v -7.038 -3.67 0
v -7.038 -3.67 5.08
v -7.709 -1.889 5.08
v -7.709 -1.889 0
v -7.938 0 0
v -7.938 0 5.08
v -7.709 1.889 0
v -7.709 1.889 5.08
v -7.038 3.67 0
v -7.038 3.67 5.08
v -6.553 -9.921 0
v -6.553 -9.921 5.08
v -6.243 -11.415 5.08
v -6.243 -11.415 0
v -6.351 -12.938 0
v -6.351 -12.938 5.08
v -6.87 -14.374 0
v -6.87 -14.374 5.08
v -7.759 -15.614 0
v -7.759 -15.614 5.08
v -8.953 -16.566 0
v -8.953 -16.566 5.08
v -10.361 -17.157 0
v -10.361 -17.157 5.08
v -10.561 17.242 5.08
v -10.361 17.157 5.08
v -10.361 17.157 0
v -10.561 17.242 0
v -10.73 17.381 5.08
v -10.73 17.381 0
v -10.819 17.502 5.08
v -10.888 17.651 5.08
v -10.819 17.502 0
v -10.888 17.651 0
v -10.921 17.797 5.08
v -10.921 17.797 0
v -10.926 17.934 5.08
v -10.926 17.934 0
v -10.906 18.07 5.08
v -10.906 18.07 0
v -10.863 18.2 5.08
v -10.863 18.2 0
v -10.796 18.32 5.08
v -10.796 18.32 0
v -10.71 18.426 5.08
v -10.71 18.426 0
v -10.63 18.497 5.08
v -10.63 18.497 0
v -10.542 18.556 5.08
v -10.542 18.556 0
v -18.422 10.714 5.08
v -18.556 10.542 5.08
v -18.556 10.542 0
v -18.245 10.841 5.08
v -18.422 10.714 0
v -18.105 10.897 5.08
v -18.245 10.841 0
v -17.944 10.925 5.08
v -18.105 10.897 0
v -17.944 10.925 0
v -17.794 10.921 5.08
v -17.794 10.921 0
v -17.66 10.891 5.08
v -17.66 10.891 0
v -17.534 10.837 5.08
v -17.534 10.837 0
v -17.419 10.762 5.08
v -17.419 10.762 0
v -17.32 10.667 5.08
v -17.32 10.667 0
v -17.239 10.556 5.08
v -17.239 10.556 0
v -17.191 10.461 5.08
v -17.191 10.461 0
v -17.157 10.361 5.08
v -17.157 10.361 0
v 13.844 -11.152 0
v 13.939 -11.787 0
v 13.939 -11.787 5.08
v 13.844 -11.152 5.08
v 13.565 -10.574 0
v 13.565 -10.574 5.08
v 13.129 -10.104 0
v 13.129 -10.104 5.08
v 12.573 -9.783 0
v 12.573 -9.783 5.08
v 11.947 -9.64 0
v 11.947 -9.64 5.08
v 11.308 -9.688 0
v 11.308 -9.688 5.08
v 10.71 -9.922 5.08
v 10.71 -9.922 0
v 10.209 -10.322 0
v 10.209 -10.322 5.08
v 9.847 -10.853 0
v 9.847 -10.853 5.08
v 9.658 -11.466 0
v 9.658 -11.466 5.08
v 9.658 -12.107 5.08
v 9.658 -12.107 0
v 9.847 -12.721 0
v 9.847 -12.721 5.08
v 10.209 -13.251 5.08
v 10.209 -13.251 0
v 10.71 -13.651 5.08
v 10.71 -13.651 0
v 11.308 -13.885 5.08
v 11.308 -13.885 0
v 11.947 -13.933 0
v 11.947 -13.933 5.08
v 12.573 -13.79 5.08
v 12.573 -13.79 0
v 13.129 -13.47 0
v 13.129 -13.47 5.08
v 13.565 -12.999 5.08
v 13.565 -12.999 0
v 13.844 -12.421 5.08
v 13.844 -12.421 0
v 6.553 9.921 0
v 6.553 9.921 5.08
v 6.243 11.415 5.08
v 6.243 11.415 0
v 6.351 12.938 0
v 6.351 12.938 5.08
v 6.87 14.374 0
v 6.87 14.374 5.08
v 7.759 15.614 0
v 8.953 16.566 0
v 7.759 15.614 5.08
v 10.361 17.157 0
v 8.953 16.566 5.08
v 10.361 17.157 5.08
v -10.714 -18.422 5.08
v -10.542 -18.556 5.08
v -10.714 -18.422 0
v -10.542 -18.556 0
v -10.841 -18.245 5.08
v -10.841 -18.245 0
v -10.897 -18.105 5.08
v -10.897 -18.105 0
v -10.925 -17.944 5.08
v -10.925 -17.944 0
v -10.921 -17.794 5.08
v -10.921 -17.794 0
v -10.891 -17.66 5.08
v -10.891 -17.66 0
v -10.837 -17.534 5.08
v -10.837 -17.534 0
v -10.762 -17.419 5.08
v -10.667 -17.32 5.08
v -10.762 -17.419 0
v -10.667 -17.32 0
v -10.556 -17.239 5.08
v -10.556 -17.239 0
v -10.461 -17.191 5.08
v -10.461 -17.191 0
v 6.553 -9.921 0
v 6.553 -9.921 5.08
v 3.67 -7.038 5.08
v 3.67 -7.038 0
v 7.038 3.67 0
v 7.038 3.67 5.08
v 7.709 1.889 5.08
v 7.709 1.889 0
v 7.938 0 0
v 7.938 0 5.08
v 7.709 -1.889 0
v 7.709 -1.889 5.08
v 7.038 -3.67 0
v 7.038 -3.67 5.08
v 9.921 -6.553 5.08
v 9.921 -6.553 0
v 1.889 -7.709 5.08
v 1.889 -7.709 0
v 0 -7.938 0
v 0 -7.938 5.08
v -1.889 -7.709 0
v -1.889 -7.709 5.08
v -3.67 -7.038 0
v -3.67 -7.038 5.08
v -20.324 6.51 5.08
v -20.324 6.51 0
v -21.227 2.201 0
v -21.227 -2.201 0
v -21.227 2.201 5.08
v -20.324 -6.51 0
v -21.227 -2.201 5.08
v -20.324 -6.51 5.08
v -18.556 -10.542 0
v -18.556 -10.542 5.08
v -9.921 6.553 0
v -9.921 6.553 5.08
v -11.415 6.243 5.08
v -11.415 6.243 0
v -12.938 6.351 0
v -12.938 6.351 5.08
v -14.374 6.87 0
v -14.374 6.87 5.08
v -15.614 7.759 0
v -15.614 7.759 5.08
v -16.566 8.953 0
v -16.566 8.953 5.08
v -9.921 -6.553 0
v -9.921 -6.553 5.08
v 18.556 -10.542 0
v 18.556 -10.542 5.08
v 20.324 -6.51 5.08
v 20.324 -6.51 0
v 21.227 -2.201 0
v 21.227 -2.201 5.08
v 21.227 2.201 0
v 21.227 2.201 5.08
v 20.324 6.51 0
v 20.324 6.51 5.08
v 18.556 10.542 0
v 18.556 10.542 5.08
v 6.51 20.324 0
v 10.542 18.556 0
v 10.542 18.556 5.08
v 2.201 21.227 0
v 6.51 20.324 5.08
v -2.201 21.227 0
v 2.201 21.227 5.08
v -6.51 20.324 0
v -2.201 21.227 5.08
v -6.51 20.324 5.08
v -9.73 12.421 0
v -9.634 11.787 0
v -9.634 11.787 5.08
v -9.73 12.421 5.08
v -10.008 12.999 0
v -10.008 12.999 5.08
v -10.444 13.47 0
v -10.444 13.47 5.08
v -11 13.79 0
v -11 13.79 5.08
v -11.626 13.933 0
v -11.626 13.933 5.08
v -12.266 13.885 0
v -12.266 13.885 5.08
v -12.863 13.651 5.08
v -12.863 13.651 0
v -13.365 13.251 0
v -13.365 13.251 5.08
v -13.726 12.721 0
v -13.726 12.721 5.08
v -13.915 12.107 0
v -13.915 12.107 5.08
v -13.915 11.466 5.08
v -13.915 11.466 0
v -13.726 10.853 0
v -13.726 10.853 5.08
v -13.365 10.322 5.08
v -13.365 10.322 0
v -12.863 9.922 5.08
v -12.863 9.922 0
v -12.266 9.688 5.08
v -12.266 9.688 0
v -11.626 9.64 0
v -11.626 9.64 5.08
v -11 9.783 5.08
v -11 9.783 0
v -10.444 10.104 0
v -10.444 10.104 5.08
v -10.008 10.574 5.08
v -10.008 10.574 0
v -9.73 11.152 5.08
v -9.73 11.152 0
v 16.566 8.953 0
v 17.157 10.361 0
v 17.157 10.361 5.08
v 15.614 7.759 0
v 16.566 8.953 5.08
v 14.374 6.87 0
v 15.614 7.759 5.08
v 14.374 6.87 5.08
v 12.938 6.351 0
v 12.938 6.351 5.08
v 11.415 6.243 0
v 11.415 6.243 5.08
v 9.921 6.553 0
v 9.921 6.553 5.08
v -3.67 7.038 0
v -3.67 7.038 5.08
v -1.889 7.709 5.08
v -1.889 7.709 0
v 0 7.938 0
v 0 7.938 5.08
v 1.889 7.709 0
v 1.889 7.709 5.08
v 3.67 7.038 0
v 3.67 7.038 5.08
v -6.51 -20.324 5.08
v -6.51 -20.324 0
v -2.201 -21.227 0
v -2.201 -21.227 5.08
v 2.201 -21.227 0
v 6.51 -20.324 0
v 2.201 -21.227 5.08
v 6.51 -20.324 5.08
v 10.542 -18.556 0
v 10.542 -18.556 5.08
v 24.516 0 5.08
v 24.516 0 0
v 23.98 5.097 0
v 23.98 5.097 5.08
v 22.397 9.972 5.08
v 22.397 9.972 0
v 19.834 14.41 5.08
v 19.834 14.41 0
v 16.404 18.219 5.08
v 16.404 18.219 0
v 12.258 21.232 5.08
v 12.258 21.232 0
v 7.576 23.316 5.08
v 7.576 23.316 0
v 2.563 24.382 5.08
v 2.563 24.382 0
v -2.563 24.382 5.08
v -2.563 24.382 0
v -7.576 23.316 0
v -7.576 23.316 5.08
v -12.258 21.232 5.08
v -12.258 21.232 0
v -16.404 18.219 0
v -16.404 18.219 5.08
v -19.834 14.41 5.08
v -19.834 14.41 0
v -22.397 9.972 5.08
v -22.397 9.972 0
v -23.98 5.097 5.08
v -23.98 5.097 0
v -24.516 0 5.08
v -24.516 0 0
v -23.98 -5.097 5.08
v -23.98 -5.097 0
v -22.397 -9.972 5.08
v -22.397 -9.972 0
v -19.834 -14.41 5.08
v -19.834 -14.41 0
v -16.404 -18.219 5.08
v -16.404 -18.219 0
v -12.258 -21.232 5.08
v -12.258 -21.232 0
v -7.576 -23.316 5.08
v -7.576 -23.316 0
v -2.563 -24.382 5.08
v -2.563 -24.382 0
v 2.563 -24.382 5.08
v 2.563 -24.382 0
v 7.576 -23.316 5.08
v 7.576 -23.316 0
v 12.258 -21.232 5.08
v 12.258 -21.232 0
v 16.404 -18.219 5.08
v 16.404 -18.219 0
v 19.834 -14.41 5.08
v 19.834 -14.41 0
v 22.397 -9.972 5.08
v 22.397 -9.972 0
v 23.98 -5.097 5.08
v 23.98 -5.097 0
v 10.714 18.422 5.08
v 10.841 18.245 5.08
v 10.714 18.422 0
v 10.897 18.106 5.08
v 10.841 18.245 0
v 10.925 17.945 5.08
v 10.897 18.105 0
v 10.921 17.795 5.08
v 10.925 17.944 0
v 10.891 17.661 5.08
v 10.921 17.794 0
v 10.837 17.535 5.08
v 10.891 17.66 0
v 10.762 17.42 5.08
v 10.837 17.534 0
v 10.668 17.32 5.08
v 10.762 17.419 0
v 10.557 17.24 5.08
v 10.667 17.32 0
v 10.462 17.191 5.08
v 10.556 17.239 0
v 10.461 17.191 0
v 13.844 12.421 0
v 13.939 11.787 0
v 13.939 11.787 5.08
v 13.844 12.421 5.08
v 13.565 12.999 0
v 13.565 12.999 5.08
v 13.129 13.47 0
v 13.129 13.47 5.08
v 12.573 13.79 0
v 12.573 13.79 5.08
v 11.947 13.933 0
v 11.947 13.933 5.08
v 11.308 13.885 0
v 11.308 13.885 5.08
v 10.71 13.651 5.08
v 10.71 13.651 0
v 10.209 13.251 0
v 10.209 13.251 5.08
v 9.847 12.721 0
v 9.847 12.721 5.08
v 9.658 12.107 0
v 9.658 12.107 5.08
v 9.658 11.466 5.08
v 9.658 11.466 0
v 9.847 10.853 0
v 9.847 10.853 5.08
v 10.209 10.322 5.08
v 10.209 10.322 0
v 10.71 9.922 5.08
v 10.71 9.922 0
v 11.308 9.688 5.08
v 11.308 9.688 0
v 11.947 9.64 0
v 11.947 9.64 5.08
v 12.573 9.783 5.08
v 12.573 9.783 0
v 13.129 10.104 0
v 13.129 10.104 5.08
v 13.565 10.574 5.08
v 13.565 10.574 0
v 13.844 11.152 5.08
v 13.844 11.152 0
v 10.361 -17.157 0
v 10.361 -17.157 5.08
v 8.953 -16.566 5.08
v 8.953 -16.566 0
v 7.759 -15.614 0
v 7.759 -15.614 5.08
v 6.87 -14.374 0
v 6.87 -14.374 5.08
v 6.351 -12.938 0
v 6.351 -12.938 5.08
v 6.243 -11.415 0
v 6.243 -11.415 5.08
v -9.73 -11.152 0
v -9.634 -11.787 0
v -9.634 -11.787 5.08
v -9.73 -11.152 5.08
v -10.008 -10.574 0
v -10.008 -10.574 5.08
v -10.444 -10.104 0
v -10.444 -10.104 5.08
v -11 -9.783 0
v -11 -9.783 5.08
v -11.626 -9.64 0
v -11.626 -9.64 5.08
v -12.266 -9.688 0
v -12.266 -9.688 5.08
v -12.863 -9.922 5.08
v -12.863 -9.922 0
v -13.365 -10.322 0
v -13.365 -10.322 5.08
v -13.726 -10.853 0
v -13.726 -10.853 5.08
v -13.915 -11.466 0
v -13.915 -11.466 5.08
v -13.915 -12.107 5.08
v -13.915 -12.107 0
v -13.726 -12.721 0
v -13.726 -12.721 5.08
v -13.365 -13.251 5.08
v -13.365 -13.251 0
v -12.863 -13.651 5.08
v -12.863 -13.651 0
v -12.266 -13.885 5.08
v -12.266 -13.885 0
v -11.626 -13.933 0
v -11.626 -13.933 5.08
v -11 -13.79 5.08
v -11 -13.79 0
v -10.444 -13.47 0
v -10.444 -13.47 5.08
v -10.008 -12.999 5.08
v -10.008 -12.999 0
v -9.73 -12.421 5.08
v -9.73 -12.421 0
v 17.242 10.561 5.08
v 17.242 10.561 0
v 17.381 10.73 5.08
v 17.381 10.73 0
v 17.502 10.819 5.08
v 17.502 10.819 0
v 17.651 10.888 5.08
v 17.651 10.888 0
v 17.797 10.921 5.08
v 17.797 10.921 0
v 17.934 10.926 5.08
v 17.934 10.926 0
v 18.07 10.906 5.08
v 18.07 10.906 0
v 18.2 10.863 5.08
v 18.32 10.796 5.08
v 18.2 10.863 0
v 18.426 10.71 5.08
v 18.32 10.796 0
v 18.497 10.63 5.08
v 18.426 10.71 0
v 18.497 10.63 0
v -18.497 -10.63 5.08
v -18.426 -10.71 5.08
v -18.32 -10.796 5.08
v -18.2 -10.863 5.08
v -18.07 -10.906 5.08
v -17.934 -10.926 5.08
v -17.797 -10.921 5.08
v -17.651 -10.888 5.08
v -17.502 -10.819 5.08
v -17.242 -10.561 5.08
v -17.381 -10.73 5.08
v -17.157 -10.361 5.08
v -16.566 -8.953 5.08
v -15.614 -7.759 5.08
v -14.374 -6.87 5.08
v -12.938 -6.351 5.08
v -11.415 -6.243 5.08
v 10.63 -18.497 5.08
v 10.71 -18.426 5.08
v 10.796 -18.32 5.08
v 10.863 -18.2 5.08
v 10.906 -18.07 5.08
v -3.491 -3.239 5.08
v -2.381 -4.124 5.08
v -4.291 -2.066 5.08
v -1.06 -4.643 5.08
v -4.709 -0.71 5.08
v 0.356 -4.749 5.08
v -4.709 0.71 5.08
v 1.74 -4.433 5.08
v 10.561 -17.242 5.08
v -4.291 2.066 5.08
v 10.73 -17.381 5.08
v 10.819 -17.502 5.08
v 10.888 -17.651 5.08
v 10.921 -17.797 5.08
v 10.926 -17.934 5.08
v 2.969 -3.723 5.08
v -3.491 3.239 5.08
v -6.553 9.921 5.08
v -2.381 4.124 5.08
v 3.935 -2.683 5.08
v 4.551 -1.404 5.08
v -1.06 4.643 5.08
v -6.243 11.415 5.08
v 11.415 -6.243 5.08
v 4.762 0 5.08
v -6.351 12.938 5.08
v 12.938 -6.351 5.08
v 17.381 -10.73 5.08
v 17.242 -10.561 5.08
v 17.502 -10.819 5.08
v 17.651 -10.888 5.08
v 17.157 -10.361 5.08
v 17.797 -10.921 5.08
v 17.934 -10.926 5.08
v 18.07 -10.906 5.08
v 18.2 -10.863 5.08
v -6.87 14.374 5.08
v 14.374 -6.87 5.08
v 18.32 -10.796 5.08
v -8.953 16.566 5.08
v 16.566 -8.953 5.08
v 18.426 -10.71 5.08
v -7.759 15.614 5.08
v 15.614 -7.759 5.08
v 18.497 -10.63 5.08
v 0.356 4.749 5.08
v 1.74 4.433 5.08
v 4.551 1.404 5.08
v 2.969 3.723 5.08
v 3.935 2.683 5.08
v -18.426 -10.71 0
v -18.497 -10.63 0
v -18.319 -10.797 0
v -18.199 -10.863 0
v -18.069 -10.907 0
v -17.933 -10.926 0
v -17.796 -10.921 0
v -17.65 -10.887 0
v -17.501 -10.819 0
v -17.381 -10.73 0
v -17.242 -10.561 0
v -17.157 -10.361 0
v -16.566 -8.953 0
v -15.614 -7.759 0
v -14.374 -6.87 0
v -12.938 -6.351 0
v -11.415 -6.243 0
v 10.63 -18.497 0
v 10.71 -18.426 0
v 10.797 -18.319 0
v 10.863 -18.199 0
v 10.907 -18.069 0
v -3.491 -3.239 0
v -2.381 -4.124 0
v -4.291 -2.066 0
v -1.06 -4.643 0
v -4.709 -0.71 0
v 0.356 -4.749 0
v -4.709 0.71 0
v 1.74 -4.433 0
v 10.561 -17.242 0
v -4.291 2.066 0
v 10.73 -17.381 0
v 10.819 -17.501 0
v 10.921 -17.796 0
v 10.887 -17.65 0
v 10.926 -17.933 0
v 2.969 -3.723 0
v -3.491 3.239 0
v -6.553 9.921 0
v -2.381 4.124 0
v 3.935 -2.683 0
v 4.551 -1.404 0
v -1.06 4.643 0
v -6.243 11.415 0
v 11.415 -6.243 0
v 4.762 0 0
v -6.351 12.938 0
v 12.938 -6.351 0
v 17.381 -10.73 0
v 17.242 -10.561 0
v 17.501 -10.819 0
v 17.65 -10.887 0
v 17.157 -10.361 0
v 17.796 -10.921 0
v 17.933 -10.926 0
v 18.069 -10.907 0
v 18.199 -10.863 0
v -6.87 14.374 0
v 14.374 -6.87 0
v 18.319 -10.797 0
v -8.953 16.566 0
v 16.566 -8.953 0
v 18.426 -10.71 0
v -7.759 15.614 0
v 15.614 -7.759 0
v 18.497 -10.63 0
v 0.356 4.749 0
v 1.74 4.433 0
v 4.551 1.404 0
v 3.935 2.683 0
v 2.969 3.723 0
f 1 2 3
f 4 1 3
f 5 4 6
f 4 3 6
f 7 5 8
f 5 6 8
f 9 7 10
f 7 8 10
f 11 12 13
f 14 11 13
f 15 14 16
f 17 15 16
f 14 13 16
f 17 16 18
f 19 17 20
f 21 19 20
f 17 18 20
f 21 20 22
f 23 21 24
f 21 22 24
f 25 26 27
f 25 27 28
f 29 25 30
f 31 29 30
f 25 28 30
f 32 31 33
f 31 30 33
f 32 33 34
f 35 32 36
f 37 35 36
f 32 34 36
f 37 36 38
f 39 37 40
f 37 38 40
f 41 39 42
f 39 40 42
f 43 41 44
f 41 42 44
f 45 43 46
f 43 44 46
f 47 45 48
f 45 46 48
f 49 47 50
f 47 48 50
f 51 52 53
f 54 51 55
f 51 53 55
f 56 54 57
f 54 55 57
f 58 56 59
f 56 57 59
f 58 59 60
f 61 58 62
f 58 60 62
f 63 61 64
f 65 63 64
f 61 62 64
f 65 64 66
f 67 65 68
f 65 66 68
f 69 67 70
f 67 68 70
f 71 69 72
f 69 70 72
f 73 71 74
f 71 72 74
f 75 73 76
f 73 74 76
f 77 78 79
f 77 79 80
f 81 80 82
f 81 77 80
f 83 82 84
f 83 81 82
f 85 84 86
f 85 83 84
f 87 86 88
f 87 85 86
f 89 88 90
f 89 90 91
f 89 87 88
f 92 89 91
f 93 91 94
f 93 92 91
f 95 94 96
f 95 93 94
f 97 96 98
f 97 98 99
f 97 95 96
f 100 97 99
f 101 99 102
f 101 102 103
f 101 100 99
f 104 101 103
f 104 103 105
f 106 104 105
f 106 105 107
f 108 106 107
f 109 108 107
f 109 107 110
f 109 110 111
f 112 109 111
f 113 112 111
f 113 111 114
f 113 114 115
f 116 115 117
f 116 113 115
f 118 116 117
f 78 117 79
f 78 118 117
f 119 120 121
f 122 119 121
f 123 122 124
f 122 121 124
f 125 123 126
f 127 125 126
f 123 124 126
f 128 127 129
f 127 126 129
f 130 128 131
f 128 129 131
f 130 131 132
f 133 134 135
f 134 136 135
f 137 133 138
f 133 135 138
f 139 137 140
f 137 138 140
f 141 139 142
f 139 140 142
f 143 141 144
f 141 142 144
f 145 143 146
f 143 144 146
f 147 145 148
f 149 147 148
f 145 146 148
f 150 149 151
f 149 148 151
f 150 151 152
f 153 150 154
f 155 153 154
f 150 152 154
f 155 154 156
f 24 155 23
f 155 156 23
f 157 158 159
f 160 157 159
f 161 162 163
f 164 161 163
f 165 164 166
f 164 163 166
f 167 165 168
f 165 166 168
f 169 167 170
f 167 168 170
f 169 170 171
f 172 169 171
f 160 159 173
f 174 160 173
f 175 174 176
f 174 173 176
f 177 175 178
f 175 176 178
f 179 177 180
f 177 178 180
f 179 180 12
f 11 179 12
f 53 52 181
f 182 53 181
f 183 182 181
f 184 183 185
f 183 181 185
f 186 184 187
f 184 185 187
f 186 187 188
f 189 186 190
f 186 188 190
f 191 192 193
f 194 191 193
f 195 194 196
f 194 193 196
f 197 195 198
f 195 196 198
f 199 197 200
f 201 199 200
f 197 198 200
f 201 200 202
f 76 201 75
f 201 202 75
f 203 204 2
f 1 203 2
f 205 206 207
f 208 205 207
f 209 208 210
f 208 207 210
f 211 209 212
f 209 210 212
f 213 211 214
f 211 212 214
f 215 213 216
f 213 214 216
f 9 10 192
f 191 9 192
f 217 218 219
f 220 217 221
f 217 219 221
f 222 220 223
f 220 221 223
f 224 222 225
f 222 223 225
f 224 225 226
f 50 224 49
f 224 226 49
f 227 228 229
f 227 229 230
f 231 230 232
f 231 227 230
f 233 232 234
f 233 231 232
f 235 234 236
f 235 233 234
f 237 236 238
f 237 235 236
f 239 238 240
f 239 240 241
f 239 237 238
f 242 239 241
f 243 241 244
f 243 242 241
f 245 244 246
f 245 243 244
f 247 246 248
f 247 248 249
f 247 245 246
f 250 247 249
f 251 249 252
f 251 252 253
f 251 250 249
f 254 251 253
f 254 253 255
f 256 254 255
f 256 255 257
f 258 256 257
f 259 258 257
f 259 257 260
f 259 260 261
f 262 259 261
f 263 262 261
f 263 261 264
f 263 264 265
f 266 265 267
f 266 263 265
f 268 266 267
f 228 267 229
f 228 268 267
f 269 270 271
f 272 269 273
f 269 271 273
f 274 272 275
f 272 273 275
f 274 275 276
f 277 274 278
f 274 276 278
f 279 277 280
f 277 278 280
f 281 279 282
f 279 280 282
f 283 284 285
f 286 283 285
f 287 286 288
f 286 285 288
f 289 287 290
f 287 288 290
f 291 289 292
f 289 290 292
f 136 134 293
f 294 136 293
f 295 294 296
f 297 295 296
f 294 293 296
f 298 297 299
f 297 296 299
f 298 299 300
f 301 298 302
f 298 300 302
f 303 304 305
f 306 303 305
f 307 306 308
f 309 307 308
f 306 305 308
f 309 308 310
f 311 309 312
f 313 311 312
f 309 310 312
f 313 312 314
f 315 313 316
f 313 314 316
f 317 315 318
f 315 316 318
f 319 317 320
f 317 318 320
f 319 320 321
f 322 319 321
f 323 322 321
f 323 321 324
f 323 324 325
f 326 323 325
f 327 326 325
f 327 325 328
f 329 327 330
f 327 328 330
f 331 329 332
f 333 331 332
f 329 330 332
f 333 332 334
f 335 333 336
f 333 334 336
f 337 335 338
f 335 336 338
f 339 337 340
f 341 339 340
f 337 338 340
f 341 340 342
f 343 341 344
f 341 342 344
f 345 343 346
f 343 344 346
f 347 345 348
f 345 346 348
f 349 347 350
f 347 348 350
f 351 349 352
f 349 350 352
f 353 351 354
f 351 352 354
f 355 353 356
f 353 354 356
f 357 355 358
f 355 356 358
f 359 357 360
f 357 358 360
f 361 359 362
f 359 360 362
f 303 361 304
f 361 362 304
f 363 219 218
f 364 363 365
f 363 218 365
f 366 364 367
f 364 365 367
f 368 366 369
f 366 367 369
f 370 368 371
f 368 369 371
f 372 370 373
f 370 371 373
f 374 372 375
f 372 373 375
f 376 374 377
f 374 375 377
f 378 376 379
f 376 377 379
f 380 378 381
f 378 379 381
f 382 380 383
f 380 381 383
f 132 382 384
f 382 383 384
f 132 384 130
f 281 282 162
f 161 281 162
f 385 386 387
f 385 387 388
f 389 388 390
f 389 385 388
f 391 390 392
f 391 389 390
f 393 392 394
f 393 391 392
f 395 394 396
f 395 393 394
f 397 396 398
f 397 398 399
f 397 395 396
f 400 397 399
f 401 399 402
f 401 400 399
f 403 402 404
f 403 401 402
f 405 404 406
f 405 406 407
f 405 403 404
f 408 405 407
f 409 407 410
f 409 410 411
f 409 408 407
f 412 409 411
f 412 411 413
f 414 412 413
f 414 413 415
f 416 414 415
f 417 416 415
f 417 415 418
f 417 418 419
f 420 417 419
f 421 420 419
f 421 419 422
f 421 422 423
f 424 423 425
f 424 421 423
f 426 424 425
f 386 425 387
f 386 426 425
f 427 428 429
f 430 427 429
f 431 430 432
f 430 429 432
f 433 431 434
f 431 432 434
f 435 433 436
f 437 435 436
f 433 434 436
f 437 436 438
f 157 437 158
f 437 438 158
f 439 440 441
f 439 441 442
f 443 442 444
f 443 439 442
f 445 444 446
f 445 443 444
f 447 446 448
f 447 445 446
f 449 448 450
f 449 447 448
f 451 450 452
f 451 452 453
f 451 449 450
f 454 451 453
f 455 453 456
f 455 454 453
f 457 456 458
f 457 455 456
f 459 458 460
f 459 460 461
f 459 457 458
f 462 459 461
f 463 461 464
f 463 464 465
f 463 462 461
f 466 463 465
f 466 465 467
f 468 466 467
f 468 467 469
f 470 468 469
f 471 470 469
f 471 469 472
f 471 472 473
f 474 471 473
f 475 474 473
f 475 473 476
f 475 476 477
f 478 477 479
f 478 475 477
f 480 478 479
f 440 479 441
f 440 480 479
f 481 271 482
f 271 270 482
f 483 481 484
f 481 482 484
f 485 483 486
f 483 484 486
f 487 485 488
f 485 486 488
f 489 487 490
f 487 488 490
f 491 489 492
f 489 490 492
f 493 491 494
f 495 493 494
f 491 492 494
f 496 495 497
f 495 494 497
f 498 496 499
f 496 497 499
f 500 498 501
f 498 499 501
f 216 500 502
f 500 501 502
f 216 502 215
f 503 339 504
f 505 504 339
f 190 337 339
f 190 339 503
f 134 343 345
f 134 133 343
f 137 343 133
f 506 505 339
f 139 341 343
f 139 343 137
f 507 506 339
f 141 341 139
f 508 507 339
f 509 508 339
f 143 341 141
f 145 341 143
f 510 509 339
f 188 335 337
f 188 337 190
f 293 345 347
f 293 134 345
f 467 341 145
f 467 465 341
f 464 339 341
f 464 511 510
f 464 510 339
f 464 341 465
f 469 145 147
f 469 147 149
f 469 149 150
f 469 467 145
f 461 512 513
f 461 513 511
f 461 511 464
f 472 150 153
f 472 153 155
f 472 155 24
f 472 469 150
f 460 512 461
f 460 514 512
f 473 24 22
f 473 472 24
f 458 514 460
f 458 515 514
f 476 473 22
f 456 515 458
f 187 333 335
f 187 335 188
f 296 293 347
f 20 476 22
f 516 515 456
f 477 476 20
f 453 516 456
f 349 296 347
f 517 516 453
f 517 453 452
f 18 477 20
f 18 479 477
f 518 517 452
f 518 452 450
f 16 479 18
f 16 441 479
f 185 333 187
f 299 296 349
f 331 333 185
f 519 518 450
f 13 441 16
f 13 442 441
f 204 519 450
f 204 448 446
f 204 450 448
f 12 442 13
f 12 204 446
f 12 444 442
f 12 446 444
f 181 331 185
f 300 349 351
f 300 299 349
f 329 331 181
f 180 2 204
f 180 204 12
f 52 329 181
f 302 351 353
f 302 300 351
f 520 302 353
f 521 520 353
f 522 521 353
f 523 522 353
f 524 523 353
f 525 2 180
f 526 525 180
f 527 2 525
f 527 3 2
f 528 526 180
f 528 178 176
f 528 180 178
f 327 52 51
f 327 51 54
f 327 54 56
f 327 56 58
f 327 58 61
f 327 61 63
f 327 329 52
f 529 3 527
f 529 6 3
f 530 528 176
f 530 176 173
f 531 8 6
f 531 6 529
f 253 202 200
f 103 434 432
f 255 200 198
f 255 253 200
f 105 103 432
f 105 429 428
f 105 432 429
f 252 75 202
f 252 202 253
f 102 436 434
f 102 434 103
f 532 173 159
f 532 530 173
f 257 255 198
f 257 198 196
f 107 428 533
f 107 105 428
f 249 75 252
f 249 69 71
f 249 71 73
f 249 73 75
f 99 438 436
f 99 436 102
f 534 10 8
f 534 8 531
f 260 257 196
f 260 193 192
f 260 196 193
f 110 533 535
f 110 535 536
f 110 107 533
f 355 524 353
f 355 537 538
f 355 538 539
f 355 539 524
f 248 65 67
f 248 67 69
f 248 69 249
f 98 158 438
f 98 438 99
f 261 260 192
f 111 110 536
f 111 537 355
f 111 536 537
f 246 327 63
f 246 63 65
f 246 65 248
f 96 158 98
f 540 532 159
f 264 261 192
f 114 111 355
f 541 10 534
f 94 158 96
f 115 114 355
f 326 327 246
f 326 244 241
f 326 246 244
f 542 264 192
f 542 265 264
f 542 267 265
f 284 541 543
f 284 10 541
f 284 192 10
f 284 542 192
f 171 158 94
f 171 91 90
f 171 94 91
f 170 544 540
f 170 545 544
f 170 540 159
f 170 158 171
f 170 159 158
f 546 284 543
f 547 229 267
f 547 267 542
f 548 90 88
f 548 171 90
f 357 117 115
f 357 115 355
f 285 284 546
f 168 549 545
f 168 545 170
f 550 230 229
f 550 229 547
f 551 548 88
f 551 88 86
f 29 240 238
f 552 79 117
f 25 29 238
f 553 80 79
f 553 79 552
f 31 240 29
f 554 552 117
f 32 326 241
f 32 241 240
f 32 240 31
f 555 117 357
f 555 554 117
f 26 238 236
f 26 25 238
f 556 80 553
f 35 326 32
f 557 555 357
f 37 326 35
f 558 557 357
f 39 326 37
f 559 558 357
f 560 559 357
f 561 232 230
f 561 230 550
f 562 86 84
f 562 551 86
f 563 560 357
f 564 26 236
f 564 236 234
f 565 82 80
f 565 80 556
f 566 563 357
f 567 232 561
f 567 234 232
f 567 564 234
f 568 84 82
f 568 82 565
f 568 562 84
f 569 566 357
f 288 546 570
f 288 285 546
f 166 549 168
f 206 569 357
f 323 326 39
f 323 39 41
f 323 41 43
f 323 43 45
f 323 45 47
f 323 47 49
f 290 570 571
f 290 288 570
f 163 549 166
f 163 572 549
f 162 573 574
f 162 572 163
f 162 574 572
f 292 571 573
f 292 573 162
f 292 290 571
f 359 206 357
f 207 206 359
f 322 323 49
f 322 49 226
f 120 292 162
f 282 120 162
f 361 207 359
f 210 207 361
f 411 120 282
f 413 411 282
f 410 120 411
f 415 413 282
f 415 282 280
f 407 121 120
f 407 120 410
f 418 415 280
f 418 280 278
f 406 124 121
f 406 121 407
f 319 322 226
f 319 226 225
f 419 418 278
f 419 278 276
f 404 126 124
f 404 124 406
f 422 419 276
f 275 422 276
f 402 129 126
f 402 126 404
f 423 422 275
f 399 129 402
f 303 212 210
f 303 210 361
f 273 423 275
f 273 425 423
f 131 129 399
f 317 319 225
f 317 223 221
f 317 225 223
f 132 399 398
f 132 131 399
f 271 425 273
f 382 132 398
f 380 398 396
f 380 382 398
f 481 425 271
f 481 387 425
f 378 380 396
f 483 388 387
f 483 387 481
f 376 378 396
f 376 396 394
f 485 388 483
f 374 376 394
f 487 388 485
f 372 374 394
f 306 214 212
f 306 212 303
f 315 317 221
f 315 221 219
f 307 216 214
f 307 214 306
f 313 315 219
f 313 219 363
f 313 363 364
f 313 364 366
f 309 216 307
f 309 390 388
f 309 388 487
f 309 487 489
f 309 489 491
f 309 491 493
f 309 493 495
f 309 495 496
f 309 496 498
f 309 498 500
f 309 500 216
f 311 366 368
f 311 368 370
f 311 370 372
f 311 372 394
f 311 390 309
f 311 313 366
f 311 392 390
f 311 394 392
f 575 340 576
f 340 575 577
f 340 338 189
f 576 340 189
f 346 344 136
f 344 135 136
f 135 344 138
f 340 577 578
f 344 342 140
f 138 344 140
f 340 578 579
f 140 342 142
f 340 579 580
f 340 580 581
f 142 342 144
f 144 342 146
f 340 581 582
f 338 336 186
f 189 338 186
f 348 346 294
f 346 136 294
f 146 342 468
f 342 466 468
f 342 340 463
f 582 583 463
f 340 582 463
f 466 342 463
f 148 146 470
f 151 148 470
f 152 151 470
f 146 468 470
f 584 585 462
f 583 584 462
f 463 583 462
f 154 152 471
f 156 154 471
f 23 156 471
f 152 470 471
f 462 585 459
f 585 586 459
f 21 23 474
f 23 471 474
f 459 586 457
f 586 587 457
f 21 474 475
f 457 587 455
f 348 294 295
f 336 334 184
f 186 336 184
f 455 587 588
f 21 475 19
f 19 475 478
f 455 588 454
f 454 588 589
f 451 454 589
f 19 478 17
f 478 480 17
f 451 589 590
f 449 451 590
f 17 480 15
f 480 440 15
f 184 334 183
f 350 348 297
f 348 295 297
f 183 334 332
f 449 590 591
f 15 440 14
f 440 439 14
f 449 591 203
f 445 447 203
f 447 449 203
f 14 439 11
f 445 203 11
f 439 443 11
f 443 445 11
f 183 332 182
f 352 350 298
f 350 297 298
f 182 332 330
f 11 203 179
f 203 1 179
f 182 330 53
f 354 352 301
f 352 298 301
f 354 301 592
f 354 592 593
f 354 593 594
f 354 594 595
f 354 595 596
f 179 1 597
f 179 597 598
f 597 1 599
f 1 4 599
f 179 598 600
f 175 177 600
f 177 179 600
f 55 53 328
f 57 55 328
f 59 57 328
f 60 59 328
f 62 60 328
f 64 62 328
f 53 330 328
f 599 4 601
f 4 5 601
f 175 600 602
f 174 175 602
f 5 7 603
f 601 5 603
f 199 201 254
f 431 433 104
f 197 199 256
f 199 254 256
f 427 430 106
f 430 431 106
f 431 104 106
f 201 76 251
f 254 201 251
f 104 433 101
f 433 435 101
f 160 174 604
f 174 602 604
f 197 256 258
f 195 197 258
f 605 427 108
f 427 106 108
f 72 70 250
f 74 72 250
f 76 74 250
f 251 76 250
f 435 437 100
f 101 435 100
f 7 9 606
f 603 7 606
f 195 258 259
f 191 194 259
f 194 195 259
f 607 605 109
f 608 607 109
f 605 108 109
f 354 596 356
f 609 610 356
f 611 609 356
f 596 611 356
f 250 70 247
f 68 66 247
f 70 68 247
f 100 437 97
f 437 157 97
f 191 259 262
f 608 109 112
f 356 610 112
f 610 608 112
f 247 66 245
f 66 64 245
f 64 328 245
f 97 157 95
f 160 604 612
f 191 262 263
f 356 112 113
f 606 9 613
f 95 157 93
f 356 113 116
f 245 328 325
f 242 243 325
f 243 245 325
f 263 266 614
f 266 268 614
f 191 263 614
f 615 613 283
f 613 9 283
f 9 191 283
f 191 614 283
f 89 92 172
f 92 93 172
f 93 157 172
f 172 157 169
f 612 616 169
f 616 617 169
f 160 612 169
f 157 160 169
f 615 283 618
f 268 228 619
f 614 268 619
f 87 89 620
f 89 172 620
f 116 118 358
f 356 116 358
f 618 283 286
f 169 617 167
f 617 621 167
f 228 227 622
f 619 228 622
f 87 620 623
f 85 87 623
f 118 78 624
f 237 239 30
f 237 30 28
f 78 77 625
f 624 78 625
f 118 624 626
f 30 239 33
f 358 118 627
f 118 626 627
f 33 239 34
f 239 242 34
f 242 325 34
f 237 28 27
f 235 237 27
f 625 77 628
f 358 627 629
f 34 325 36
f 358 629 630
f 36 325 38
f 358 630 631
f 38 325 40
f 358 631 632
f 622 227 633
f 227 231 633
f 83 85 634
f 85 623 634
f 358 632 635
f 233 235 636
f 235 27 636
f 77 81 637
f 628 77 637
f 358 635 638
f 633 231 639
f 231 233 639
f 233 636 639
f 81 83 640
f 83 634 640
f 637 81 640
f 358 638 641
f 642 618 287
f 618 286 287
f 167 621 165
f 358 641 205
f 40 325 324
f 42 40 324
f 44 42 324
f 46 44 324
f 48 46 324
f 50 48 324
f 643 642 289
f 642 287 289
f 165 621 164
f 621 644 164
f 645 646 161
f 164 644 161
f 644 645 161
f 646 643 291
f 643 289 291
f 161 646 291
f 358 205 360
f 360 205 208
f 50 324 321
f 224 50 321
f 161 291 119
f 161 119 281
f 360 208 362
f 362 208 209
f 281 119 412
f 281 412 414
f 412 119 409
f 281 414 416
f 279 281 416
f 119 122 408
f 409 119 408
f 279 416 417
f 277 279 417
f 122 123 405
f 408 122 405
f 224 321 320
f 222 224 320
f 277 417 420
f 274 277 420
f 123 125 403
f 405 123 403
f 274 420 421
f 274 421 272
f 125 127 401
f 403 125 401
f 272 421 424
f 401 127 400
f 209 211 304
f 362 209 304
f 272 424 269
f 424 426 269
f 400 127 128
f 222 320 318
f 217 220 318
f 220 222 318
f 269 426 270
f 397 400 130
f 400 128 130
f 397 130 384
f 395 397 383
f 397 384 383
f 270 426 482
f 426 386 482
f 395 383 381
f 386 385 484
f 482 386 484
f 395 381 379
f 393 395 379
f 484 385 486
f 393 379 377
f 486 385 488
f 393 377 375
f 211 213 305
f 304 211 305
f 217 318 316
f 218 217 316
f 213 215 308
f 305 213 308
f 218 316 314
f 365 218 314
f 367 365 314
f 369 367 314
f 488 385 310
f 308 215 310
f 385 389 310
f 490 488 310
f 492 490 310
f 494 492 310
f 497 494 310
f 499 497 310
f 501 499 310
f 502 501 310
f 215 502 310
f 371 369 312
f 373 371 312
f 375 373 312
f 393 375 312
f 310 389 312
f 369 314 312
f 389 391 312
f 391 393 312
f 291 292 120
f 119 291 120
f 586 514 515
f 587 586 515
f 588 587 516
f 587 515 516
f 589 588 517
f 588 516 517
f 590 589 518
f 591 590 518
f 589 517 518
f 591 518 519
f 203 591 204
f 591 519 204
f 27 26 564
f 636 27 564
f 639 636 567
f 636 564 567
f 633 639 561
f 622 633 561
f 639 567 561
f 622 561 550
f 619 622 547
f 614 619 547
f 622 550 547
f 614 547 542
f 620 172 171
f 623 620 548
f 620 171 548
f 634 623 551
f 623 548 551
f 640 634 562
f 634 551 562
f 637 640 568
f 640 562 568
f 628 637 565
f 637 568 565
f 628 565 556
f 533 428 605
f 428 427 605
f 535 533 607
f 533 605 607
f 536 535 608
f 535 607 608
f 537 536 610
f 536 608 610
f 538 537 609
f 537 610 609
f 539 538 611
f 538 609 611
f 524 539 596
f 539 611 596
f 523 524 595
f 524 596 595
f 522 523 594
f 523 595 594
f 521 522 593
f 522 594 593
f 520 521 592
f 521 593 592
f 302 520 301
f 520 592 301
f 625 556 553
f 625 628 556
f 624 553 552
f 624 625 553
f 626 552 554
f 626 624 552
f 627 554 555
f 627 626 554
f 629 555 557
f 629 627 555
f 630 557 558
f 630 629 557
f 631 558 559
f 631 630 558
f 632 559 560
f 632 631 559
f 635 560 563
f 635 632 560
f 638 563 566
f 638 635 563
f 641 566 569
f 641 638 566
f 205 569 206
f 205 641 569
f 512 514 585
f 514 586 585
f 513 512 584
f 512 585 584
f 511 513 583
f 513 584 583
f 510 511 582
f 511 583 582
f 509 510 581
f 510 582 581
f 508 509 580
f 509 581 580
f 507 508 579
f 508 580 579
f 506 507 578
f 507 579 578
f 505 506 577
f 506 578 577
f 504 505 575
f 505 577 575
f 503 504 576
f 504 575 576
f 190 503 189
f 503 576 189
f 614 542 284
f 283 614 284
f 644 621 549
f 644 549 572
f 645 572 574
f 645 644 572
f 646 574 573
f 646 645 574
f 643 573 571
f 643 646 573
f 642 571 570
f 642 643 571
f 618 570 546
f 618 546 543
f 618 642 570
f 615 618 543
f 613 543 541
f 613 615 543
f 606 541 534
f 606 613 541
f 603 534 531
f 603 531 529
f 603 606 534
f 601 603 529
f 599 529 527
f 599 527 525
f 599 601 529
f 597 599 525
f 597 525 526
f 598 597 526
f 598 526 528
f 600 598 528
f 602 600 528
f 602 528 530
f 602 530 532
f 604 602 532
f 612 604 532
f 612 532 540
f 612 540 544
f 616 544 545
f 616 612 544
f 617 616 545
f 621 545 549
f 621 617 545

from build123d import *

# Parameters (mm, degrees)
F0_R            = 24.51608
F0_R_2          = 2.15265
F0_R_3          = 4.7625
F1_DEPTH        = 5.08
F3_DEPTH        = 5.08
F3_COPIES_COUNT = 4
F4_R            = 0.762


# Not quite as in the source:
# - a pattern or mirror of a feature is missing from the dataset's text; its kind, count and spacing are read off the source's solid


with BuildPart() as f1:
    # F0 (on Top) → F1 (new body)
    with BuildSketch(Plane.XY):
        Circle(F0_R)
        with Locations((-11.7865906, -11.7865906)):
            Circle(F0_R_2, mode=Mode.SUBTRACT)
        with Locations((11.7865906, -11.7865906)):
            Circle(F0_R_2, mode=Mode.SUBTRACT)
        with Locations((-11.7865906, 11.7865906)):
            Circle(F0_R_2, mode=Mode.SUBTRACT)
        Circle(F0_R_3, mode=Mode.SUBTRACT)
        with Locations((11.7865906, 11.7865906)):
            Circle(F0_R_2, mode=Mode.SUBTRACT)
    extrude(amount=F1_DEPTH)

    # F2 (on face) → F3 (cut, through all)
    with BuildSketch(Plane.XY.offset(5.08)):
        with BuildLine():
            ThreePointArc((-12.5005198818, 17.2967828873), (-7.4612395718, 15.2741760893), (-6.553034663, 9.9206307084))
            Line((-6.553034663, 9.9206307084), (-3.6703384477, 7.0379344931))
            ThreePointArc((-3.6703384477, 7.0379344931), (0, 7.9375), (3.6703384477, 7.0379344931))
            Line((3.6703384477, 7.0379344931), (6.553034663, 9.9206307084))
            ThreePointArc((6.553034663, 9.9206307084), (7.4612395718, 15.2741760893), (12.5005198818, 17.2967828873))
            ThreePointArc((12.5005198818, 17.2967828873), (0, 21.34108), (-12.5005198818, 17.2967828873))
        make_face()
    f3 = extrude(amount=-F3_DEPTH, mode=Mode.SUBTRACT)

    # F3_copies: F3 ×4 about axis
    f3_copies_axis = Axis((0, 0, 0), (0, 0, 1))
    for i in range(1, F3_COPIES_COUNT):
        add(f3.rotate(f3_copies_axis, i * 360 / F3_COPIES_COUNT), mode=Mode.SUBTRACT)

    # F4
    f4_edges = [f1.edges().sort_by_distance(p)[0] for p in [
        (-12.50052, 17.296783, 2.54),
        (12.50052, 17.296783, 2.54),
        (-17.296783, -12.50052, 2.54),
        (-17.296783, 12.50052, 2.54),
        (12.50052, -17.296783, 2.54),
        (-12.50052, -17.296783, 2.54),
        (17.296783, 12.50052, 2.54),
        (17.296783, -12.50052, 2.54),
    ]]
    fillet(f4_edges, radius=F4_R)


solid = f1.part
